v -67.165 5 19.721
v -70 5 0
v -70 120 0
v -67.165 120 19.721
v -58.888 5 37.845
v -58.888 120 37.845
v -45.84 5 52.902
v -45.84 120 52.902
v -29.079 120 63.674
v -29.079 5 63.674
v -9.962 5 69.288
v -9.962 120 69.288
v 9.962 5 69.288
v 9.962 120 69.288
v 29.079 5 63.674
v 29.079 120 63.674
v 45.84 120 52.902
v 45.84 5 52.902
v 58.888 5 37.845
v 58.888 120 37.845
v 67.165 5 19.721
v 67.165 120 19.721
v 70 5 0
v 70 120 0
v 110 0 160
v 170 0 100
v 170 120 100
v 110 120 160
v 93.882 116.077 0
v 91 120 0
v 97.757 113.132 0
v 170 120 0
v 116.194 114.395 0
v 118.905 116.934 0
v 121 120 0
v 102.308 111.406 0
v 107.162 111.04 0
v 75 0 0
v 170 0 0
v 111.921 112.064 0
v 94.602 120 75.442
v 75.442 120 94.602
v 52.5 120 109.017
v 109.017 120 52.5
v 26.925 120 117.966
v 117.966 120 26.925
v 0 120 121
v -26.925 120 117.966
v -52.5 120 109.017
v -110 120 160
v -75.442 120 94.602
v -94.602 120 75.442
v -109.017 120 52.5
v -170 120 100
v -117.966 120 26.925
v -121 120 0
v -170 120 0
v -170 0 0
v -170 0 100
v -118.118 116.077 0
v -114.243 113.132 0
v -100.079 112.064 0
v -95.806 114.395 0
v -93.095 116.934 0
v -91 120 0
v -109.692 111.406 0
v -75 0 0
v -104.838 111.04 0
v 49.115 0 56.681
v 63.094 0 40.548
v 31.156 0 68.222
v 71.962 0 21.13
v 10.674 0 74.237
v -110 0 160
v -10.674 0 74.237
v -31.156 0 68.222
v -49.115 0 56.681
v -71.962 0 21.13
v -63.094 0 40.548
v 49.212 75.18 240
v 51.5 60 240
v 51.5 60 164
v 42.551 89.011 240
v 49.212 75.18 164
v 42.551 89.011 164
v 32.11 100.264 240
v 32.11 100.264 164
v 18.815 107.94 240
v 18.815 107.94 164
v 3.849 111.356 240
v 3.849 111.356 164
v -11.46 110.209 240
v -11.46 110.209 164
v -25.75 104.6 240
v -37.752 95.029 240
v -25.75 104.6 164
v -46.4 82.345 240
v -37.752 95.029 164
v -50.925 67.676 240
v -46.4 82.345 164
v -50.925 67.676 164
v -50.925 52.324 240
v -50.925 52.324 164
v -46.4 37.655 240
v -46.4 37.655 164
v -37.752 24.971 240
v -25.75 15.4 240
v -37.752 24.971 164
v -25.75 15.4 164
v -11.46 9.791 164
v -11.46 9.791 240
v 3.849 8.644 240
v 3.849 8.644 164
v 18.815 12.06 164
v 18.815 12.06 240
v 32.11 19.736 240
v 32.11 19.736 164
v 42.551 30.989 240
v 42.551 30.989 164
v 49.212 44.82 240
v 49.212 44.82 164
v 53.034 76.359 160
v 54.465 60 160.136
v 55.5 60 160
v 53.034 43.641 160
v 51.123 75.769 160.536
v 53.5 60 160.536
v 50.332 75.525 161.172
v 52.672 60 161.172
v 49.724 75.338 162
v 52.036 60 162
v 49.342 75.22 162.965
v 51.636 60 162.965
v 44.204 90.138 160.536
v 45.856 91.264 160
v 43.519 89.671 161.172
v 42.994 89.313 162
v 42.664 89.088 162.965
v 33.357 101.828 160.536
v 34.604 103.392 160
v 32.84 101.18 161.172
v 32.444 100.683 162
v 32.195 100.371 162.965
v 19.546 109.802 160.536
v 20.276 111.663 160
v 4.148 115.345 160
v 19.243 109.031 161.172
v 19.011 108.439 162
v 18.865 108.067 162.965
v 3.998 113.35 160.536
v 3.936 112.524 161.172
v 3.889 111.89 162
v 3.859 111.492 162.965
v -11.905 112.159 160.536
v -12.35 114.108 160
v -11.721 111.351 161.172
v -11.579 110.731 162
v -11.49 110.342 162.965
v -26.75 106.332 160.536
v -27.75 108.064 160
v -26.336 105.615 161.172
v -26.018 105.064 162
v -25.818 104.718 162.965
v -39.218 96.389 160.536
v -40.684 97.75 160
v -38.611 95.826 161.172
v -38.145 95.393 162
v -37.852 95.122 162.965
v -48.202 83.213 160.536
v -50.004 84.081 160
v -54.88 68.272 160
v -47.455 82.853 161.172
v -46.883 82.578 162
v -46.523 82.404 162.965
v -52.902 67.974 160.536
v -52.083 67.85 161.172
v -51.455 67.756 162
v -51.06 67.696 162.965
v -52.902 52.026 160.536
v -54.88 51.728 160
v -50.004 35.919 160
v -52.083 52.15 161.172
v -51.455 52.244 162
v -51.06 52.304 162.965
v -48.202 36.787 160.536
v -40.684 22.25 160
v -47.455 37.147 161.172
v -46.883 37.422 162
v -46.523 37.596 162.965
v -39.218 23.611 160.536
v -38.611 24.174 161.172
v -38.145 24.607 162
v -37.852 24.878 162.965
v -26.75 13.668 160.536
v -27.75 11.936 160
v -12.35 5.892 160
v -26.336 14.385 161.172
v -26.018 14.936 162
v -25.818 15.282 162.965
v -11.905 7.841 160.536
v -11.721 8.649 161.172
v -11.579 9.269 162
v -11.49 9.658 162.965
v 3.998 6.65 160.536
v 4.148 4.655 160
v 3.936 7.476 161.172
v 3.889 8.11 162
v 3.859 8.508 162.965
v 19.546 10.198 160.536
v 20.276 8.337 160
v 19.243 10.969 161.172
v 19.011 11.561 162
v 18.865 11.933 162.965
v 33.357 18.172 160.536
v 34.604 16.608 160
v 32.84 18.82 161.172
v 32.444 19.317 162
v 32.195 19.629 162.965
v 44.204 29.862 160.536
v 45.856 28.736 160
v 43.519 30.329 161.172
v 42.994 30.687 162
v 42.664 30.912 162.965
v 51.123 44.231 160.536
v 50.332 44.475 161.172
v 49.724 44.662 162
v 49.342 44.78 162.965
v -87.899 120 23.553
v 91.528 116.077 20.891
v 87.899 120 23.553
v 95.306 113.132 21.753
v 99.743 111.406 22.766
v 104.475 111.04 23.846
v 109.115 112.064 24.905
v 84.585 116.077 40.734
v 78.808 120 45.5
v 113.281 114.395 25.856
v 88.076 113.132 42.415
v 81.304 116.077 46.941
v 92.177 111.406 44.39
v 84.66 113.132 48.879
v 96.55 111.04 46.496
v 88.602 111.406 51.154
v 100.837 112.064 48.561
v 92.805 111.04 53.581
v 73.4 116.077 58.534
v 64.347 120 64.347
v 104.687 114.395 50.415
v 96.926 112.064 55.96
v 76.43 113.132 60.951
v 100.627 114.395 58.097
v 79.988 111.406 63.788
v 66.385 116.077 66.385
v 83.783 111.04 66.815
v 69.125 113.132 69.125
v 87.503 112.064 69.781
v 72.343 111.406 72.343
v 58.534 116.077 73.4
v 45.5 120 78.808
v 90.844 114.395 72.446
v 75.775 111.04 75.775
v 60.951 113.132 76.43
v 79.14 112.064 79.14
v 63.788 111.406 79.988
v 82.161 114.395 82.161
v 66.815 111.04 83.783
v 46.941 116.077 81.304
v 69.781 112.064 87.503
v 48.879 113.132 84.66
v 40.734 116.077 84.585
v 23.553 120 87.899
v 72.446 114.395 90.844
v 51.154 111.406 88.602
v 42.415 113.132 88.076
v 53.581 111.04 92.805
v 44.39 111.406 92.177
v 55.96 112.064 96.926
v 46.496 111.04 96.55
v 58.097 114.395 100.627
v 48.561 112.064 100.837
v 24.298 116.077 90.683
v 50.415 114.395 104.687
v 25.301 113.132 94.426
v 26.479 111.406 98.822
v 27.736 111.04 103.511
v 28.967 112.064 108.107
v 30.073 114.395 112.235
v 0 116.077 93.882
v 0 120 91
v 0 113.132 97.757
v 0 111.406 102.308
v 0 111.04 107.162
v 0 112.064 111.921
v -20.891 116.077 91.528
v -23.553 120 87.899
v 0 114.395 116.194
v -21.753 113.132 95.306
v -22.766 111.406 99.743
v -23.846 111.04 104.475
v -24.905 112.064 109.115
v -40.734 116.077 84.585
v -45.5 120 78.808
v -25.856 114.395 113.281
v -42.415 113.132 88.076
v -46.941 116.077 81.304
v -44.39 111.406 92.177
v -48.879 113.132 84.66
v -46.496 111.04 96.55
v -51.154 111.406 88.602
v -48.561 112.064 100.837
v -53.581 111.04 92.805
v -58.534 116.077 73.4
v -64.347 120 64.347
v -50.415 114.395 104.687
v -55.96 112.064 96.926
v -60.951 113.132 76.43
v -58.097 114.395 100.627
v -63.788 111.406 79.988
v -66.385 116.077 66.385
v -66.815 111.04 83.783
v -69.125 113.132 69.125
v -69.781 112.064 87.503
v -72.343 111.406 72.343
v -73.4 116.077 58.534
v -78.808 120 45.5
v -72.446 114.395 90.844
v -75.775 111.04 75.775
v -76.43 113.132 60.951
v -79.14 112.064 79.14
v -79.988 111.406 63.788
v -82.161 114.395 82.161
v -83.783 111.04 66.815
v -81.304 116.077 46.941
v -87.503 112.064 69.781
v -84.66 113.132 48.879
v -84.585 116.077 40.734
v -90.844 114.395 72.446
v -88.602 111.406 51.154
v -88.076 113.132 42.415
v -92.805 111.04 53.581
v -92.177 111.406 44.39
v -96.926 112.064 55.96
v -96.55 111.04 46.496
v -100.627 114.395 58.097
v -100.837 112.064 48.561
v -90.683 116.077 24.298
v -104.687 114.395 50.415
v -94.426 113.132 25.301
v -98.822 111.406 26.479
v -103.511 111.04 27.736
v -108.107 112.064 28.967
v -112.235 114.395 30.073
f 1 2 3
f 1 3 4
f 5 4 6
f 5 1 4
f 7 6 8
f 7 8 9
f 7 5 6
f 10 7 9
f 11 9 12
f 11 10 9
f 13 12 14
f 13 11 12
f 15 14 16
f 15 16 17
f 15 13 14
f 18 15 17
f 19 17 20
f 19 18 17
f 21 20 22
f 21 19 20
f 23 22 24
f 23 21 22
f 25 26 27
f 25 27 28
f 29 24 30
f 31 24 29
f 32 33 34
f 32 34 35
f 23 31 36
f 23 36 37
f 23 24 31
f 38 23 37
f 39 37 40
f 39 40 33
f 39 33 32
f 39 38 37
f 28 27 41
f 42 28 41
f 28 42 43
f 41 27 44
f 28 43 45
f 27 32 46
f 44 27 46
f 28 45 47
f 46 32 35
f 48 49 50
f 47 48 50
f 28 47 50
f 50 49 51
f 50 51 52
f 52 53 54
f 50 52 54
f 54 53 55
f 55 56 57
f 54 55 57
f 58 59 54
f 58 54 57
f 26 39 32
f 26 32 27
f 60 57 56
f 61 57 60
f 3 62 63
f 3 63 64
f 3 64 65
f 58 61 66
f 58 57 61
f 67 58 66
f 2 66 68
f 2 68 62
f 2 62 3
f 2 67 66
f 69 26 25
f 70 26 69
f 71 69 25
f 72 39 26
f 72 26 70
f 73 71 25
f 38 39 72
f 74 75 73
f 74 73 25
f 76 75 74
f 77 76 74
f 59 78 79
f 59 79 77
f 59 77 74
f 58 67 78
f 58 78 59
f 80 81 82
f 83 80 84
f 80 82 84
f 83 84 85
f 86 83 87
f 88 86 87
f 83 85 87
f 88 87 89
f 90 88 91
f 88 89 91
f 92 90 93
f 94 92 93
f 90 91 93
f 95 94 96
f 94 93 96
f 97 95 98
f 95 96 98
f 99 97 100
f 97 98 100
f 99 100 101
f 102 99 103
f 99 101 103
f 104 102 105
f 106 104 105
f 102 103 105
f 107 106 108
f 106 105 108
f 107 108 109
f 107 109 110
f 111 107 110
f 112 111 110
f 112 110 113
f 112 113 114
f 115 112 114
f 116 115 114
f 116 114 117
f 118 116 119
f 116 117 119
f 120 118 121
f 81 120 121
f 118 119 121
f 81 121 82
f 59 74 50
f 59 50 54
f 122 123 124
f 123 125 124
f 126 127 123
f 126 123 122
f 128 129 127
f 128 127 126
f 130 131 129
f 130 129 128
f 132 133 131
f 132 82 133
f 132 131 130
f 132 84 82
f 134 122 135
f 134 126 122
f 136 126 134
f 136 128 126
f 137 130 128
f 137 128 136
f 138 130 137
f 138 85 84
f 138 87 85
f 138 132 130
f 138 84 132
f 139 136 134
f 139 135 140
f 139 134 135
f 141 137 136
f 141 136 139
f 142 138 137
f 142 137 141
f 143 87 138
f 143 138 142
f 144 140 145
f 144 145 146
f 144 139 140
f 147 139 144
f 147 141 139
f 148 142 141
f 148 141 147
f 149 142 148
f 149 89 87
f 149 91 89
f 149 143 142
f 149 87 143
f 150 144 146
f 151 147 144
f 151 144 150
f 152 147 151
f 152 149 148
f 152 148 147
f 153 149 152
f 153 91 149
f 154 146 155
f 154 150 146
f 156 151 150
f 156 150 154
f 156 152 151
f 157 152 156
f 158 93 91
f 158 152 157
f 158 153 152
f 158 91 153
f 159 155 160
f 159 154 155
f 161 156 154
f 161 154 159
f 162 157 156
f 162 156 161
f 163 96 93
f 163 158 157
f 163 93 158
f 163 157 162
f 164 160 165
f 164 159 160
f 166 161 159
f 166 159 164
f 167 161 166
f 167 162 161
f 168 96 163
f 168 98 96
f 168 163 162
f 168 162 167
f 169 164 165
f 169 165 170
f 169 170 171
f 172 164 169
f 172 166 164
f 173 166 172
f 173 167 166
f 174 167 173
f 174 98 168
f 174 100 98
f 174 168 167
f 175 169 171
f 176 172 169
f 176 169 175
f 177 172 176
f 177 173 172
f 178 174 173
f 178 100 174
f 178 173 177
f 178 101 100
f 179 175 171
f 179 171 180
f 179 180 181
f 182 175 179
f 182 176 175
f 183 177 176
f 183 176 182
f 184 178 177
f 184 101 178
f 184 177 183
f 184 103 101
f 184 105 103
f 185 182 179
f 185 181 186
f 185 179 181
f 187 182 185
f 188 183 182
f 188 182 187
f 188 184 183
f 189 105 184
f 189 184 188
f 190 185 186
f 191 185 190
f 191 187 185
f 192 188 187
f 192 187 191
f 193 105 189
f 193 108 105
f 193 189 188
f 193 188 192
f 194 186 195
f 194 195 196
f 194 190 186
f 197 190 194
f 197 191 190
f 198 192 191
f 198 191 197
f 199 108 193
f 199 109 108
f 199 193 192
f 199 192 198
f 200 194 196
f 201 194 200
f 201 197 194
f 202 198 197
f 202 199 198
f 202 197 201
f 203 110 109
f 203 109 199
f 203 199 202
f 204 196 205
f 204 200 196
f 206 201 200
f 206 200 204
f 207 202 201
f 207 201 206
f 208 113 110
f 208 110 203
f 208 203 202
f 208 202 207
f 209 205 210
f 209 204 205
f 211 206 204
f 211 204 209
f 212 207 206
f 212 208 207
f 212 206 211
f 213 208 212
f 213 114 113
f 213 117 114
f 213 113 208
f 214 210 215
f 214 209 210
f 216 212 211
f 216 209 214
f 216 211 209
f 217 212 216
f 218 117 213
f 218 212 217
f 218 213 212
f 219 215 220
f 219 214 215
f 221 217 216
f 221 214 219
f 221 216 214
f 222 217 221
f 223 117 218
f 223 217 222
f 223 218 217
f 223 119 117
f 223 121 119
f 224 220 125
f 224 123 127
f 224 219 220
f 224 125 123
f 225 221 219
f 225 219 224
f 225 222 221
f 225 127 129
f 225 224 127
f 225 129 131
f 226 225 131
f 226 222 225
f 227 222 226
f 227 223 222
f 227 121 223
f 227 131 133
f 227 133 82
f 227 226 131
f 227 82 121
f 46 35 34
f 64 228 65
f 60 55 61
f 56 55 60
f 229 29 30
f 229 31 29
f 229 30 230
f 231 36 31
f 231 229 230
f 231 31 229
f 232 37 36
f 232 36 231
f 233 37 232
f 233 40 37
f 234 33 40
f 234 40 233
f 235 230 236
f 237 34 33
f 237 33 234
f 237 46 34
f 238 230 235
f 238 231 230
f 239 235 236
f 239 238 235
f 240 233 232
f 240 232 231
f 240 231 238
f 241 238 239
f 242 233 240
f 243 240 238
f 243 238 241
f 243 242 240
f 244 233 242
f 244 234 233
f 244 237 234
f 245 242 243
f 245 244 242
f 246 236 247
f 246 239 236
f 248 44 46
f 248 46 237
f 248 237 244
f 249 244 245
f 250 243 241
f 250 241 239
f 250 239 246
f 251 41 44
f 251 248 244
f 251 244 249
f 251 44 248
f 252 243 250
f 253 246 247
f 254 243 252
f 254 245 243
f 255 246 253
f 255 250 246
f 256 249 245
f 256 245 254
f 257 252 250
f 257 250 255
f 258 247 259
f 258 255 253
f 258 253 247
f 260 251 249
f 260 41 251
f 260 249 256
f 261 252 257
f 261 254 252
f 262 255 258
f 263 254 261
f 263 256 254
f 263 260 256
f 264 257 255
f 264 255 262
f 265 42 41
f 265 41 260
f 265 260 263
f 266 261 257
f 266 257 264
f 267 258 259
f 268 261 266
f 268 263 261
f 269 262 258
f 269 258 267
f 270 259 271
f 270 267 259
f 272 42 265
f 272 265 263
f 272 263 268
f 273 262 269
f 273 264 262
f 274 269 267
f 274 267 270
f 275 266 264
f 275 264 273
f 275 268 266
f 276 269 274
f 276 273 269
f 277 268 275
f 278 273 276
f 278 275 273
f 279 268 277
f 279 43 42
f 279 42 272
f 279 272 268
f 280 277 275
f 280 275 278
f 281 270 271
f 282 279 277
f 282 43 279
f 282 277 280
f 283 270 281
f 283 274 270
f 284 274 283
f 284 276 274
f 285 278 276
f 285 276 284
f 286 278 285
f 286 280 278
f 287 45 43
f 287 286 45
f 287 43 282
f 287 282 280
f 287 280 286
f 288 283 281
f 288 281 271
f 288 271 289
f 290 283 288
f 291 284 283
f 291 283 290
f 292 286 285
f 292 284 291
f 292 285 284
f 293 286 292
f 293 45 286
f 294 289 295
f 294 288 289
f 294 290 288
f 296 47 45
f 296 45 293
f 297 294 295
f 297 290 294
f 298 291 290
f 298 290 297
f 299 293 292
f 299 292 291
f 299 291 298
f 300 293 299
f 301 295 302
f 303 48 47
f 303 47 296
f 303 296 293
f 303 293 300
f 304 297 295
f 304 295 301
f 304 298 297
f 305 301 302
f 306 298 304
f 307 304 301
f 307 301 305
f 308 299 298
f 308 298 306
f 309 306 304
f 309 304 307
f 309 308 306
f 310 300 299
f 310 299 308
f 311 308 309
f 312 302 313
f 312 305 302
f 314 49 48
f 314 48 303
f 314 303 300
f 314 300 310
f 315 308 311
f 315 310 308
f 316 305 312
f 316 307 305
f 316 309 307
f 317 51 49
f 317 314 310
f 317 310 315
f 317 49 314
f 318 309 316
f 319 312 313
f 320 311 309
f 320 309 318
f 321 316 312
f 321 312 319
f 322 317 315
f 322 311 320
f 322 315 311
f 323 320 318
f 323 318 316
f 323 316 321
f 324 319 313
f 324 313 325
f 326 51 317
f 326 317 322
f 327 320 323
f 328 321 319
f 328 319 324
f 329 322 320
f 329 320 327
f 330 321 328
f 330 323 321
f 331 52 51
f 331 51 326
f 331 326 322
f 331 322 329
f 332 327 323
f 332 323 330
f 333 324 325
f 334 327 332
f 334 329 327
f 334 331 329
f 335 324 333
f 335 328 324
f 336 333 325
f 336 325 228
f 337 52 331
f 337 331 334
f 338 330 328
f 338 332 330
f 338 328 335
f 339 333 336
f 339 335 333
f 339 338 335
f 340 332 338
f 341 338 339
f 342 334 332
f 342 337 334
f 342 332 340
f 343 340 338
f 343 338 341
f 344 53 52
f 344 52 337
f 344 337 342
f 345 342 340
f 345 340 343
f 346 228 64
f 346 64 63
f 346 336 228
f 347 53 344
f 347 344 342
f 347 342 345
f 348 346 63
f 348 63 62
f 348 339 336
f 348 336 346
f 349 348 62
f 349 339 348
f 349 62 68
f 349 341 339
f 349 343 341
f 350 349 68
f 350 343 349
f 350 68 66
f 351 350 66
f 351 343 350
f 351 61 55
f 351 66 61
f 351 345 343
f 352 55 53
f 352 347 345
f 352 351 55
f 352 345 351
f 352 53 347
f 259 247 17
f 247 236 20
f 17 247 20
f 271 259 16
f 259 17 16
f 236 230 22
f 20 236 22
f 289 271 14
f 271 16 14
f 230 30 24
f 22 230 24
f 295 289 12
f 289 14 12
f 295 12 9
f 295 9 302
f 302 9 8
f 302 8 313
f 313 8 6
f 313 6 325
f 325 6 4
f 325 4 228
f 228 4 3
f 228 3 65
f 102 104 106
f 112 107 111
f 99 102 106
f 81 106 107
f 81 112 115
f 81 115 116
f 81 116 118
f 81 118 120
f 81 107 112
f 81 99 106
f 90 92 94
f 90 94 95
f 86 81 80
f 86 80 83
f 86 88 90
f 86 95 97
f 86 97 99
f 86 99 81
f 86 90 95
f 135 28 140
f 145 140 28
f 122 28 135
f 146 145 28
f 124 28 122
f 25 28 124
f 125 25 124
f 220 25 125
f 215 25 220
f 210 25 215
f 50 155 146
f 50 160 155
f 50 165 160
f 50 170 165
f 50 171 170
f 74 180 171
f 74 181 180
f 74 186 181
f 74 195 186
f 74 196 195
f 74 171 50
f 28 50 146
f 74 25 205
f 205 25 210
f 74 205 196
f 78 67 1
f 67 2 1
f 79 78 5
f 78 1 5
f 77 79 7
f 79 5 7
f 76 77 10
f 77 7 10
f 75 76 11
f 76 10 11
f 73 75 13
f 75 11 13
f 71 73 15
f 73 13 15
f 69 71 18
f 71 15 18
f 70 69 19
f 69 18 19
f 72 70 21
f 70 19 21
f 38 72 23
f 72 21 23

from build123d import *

# Parameters (mm, degrees)
MAIN_DEPTH              = 120
PERNO1_START            = 160
PERNO1_OUTLINE_R        = 51.5
PERNO1_DEPTH            = 80
PERNO1_2_OUTLINE_R      = 70
PERNO1_2_DEPTH          = 120
FILLET2_R               = 4
FILLET2_OF_MIRROR14_R   = 4
CHAMFER2_SIZE           = 5
PISTA_R                 = 17
CUT_EXTRUDE1_DEPTH      = 318.647603485
CUT_EXTRUDE1_DEPTH_BACK = 318.647603485
SKETCH12_W              = 447.780773858
SKETCH12_H              = 289.463518693


# Read off the part's stored shape, not the designer's step: Perno1
with BuildPart() as part:
    # MainBody → Main (new body)
    with BuildSketch(Plane(origin=(0, 0, 0), x_dir=(1, 0, 0), z_dir=(0, 1, 0))):
        Polygon((-110, 160), (110, 160), (170, 100), (170, -100), (110, -160), (-110, -160), (-170, -100), (-170, 100), align=None)
    extrude(amount=MAIN_DEPTH)

    # Perno1 outline → Perno1 (add)
    with BuildSketch(Plane.XY.offset(PERNO1_START)):
        with Locations((0, 60)):
            Circle(PERNO1_OUTLINE_R)
    perno1 = extrude(amount=PERNO1_DEPTH)

    # Perno1 2 outline → Perno1 2 (cut)
    with BuildSketch(Plane(origin=(0, 0, 0), x_dir=(1, 0, 0), z_dir=(0, 1, 0))):
        Circle(PERNO1_2_OUTLINE_R)
    perno1_2 = extrude(amount=PERNO1_2_DEPTH, mode=Mode.SUBTRACT)

    # Fillet2
    fillet2_edges = [part.edges().sort_by_distance(p)[0] for p in [
        (-51.5, 60, 160),
    ]]
    fillet(fillet2_edges, radius=FILLET2_R)

    # Mirror14: Perno1, Perno1 2 across plane
    add(perno1.mirror(Plane.XY))
    add(perno1_2.mirror(Plane.XY), mode=Mode.SUBTRACT)

    # Fillet2 of Mirror14
    fillet2_of_mirror14_edges = [part.edges().sort_by_distance(p)[0] for p in [
        (-51.5, 60, -160),
    ]]
    fillet(fillet2_of_mirror14_edges, radius=FILLET2_OF_MIRROR14_R)

    # Chamfer2
    chamfer2_edges = [part.edges().sort_by_distance(p)[0] for p in [
        (-70, 0, 0),
    ]]
    chamfer(chamfer2_edges, length=CHAMFER2_SIZE)

    # Pista → PistaCut (revolve, cut)
    with BuildSketch(Plane.XY, mode=Mode.PRIVATE) as pistacut_sk:
        with Locations((106, 128)):
            Circle(PISTA_R)
    revolve(pistacut_sk.sketch.rotate(Axis((0, 120, 0), (0, -1, 0)), 90), axis=Axis((0, 120, 0), (0, -1, 0)), mode=Mode.SUBTRACT)

    # Sketch12 → Cut-Extrude1 (cut, two sides: drawn at the far end of the back side and taken through both)
    with BuildSketch(Plane(origin=(0, 0, 0), x_dir=(1, 0, 0), z_dir=(0, 1, 0)).offset(-CUT_EXTRUDE1_DEPTH_BACK)):
        with Locations((7.371920004, 144.731759347)):
            Rectangle(SKETCH12_W, SKETCH12_H)
    extrude(amount=CUT_EXTRUDE1_DEPTH + CUT_EXTRUDE1_DEPTH_BACK, mode=Mode.SUBTRACT)


solid = part.part
